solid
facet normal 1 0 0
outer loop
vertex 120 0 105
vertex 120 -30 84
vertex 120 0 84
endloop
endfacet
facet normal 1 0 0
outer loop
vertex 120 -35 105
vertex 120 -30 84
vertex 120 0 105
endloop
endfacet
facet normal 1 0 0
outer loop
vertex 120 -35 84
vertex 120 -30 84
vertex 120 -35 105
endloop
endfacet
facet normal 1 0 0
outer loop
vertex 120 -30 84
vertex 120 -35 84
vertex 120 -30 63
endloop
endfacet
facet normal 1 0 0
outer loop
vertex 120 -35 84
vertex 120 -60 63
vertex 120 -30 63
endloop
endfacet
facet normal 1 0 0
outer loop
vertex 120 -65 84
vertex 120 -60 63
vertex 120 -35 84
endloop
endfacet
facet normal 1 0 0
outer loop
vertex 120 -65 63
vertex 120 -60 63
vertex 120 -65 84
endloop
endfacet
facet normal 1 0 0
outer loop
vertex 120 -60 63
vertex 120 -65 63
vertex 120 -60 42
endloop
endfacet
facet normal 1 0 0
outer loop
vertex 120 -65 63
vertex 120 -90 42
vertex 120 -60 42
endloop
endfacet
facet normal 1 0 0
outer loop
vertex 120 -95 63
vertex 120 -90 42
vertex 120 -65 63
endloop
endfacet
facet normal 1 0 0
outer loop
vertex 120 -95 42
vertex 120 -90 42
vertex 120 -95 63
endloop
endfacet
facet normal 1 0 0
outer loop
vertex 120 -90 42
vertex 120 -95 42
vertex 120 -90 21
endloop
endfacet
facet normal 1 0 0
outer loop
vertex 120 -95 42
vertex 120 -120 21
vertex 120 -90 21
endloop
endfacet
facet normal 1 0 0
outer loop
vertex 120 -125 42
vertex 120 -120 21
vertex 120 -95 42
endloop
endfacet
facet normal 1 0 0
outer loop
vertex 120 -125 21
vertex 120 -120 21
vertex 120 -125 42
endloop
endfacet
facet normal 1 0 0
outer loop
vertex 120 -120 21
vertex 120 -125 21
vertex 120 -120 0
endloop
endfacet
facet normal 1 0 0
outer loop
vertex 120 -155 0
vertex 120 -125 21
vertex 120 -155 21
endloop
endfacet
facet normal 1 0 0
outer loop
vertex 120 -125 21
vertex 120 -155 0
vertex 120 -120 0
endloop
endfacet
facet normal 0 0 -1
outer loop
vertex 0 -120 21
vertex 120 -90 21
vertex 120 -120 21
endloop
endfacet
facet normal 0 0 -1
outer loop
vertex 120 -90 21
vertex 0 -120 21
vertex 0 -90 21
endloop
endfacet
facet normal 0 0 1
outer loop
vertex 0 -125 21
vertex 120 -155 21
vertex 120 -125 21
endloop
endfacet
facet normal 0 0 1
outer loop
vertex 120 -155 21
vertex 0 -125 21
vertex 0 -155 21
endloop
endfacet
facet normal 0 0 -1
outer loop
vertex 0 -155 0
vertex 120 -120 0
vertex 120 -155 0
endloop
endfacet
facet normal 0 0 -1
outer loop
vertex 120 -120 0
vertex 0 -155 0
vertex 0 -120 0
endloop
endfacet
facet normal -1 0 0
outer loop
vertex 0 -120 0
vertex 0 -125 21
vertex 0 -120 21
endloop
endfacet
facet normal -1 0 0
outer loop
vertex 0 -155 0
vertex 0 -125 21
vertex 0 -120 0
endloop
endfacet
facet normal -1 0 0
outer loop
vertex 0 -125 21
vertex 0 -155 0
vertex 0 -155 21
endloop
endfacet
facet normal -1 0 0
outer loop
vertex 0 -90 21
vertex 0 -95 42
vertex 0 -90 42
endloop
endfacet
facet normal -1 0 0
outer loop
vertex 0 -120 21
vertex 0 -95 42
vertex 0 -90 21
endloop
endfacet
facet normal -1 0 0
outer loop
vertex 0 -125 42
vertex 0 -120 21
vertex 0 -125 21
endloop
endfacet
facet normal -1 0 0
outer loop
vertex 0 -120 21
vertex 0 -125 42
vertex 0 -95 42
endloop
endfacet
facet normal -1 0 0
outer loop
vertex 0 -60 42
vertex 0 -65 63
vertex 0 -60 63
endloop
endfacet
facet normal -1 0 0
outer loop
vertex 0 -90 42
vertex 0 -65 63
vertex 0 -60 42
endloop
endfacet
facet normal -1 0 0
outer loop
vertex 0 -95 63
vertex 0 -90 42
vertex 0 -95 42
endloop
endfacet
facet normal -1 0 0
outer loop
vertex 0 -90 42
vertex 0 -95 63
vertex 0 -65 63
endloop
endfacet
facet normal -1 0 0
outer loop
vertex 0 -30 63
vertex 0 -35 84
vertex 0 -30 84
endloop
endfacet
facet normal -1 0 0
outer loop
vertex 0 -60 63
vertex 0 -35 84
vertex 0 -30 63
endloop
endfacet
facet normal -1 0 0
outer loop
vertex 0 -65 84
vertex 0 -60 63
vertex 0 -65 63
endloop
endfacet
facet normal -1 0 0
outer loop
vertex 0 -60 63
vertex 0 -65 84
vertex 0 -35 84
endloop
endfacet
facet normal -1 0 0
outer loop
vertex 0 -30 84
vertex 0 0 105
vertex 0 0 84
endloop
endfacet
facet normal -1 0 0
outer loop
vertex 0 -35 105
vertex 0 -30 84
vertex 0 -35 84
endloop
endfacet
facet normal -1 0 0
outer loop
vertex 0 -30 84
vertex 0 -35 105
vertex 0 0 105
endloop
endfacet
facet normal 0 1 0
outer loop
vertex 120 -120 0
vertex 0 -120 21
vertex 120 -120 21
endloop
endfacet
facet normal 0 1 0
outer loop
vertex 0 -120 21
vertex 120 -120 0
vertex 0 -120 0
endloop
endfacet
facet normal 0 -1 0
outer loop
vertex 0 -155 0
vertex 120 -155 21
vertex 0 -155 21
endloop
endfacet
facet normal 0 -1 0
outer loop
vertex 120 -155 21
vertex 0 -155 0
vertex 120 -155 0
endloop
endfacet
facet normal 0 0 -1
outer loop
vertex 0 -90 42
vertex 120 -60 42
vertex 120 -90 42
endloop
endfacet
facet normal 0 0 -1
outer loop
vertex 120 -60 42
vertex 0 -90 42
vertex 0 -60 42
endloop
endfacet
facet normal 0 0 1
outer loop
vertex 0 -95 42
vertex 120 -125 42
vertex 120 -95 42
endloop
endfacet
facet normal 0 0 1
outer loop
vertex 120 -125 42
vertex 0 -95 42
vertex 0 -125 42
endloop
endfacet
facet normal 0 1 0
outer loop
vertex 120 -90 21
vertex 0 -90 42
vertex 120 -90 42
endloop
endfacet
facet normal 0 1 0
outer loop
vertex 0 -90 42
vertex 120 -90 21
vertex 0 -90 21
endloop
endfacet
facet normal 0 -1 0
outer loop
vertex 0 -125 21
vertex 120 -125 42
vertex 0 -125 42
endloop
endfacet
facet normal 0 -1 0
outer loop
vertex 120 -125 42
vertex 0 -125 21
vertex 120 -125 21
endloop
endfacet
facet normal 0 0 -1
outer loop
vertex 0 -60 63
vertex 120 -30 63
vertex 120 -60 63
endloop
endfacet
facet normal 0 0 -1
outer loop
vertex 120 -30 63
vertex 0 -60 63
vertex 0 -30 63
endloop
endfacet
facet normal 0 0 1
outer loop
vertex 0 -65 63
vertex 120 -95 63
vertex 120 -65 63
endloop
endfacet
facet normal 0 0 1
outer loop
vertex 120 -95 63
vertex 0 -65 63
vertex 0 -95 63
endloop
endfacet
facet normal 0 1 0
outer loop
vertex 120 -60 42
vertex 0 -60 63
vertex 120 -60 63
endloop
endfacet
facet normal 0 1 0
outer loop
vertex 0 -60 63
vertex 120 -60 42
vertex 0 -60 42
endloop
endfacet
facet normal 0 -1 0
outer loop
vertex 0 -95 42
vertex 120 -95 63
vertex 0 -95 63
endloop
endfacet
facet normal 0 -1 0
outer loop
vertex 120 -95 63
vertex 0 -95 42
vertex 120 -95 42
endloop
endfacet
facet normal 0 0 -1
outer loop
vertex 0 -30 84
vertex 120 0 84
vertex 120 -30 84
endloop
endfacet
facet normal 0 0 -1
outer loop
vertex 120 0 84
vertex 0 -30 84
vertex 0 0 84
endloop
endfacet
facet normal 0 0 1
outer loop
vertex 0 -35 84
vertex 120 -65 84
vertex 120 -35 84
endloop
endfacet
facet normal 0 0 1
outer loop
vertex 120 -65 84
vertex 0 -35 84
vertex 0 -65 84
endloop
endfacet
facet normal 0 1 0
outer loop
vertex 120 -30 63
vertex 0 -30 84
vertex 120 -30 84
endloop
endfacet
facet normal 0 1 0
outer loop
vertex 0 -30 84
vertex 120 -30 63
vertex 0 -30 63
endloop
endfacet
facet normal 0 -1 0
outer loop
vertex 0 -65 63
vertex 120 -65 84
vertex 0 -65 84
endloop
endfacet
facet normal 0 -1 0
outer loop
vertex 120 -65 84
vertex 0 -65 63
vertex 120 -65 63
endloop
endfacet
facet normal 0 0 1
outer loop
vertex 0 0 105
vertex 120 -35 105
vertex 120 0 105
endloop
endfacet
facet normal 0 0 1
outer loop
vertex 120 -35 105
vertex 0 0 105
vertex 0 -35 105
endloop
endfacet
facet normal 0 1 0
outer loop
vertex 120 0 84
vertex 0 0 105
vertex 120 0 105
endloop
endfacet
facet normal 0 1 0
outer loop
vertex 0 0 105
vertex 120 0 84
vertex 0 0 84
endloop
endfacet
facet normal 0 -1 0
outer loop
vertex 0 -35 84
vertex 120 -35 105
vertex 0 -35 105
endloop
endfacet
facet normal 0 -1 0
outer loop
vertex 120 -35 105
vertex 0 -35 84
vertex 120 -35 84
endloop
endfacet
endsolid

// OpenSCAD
// Massstab 1 entspricht einem cm

module stairs(width, count) {
   sandColor = [ 247/255, 231/255, 194/255 ];

	color(sandColor)	
	translate([0, -30 * count - 5, 0])
	for ( c = [0 : count - 1] ) {
		translate([0, 30 * c, 21 * c])
			cube([width, 35, 21]);
	}

}

stairs(120, 5);
